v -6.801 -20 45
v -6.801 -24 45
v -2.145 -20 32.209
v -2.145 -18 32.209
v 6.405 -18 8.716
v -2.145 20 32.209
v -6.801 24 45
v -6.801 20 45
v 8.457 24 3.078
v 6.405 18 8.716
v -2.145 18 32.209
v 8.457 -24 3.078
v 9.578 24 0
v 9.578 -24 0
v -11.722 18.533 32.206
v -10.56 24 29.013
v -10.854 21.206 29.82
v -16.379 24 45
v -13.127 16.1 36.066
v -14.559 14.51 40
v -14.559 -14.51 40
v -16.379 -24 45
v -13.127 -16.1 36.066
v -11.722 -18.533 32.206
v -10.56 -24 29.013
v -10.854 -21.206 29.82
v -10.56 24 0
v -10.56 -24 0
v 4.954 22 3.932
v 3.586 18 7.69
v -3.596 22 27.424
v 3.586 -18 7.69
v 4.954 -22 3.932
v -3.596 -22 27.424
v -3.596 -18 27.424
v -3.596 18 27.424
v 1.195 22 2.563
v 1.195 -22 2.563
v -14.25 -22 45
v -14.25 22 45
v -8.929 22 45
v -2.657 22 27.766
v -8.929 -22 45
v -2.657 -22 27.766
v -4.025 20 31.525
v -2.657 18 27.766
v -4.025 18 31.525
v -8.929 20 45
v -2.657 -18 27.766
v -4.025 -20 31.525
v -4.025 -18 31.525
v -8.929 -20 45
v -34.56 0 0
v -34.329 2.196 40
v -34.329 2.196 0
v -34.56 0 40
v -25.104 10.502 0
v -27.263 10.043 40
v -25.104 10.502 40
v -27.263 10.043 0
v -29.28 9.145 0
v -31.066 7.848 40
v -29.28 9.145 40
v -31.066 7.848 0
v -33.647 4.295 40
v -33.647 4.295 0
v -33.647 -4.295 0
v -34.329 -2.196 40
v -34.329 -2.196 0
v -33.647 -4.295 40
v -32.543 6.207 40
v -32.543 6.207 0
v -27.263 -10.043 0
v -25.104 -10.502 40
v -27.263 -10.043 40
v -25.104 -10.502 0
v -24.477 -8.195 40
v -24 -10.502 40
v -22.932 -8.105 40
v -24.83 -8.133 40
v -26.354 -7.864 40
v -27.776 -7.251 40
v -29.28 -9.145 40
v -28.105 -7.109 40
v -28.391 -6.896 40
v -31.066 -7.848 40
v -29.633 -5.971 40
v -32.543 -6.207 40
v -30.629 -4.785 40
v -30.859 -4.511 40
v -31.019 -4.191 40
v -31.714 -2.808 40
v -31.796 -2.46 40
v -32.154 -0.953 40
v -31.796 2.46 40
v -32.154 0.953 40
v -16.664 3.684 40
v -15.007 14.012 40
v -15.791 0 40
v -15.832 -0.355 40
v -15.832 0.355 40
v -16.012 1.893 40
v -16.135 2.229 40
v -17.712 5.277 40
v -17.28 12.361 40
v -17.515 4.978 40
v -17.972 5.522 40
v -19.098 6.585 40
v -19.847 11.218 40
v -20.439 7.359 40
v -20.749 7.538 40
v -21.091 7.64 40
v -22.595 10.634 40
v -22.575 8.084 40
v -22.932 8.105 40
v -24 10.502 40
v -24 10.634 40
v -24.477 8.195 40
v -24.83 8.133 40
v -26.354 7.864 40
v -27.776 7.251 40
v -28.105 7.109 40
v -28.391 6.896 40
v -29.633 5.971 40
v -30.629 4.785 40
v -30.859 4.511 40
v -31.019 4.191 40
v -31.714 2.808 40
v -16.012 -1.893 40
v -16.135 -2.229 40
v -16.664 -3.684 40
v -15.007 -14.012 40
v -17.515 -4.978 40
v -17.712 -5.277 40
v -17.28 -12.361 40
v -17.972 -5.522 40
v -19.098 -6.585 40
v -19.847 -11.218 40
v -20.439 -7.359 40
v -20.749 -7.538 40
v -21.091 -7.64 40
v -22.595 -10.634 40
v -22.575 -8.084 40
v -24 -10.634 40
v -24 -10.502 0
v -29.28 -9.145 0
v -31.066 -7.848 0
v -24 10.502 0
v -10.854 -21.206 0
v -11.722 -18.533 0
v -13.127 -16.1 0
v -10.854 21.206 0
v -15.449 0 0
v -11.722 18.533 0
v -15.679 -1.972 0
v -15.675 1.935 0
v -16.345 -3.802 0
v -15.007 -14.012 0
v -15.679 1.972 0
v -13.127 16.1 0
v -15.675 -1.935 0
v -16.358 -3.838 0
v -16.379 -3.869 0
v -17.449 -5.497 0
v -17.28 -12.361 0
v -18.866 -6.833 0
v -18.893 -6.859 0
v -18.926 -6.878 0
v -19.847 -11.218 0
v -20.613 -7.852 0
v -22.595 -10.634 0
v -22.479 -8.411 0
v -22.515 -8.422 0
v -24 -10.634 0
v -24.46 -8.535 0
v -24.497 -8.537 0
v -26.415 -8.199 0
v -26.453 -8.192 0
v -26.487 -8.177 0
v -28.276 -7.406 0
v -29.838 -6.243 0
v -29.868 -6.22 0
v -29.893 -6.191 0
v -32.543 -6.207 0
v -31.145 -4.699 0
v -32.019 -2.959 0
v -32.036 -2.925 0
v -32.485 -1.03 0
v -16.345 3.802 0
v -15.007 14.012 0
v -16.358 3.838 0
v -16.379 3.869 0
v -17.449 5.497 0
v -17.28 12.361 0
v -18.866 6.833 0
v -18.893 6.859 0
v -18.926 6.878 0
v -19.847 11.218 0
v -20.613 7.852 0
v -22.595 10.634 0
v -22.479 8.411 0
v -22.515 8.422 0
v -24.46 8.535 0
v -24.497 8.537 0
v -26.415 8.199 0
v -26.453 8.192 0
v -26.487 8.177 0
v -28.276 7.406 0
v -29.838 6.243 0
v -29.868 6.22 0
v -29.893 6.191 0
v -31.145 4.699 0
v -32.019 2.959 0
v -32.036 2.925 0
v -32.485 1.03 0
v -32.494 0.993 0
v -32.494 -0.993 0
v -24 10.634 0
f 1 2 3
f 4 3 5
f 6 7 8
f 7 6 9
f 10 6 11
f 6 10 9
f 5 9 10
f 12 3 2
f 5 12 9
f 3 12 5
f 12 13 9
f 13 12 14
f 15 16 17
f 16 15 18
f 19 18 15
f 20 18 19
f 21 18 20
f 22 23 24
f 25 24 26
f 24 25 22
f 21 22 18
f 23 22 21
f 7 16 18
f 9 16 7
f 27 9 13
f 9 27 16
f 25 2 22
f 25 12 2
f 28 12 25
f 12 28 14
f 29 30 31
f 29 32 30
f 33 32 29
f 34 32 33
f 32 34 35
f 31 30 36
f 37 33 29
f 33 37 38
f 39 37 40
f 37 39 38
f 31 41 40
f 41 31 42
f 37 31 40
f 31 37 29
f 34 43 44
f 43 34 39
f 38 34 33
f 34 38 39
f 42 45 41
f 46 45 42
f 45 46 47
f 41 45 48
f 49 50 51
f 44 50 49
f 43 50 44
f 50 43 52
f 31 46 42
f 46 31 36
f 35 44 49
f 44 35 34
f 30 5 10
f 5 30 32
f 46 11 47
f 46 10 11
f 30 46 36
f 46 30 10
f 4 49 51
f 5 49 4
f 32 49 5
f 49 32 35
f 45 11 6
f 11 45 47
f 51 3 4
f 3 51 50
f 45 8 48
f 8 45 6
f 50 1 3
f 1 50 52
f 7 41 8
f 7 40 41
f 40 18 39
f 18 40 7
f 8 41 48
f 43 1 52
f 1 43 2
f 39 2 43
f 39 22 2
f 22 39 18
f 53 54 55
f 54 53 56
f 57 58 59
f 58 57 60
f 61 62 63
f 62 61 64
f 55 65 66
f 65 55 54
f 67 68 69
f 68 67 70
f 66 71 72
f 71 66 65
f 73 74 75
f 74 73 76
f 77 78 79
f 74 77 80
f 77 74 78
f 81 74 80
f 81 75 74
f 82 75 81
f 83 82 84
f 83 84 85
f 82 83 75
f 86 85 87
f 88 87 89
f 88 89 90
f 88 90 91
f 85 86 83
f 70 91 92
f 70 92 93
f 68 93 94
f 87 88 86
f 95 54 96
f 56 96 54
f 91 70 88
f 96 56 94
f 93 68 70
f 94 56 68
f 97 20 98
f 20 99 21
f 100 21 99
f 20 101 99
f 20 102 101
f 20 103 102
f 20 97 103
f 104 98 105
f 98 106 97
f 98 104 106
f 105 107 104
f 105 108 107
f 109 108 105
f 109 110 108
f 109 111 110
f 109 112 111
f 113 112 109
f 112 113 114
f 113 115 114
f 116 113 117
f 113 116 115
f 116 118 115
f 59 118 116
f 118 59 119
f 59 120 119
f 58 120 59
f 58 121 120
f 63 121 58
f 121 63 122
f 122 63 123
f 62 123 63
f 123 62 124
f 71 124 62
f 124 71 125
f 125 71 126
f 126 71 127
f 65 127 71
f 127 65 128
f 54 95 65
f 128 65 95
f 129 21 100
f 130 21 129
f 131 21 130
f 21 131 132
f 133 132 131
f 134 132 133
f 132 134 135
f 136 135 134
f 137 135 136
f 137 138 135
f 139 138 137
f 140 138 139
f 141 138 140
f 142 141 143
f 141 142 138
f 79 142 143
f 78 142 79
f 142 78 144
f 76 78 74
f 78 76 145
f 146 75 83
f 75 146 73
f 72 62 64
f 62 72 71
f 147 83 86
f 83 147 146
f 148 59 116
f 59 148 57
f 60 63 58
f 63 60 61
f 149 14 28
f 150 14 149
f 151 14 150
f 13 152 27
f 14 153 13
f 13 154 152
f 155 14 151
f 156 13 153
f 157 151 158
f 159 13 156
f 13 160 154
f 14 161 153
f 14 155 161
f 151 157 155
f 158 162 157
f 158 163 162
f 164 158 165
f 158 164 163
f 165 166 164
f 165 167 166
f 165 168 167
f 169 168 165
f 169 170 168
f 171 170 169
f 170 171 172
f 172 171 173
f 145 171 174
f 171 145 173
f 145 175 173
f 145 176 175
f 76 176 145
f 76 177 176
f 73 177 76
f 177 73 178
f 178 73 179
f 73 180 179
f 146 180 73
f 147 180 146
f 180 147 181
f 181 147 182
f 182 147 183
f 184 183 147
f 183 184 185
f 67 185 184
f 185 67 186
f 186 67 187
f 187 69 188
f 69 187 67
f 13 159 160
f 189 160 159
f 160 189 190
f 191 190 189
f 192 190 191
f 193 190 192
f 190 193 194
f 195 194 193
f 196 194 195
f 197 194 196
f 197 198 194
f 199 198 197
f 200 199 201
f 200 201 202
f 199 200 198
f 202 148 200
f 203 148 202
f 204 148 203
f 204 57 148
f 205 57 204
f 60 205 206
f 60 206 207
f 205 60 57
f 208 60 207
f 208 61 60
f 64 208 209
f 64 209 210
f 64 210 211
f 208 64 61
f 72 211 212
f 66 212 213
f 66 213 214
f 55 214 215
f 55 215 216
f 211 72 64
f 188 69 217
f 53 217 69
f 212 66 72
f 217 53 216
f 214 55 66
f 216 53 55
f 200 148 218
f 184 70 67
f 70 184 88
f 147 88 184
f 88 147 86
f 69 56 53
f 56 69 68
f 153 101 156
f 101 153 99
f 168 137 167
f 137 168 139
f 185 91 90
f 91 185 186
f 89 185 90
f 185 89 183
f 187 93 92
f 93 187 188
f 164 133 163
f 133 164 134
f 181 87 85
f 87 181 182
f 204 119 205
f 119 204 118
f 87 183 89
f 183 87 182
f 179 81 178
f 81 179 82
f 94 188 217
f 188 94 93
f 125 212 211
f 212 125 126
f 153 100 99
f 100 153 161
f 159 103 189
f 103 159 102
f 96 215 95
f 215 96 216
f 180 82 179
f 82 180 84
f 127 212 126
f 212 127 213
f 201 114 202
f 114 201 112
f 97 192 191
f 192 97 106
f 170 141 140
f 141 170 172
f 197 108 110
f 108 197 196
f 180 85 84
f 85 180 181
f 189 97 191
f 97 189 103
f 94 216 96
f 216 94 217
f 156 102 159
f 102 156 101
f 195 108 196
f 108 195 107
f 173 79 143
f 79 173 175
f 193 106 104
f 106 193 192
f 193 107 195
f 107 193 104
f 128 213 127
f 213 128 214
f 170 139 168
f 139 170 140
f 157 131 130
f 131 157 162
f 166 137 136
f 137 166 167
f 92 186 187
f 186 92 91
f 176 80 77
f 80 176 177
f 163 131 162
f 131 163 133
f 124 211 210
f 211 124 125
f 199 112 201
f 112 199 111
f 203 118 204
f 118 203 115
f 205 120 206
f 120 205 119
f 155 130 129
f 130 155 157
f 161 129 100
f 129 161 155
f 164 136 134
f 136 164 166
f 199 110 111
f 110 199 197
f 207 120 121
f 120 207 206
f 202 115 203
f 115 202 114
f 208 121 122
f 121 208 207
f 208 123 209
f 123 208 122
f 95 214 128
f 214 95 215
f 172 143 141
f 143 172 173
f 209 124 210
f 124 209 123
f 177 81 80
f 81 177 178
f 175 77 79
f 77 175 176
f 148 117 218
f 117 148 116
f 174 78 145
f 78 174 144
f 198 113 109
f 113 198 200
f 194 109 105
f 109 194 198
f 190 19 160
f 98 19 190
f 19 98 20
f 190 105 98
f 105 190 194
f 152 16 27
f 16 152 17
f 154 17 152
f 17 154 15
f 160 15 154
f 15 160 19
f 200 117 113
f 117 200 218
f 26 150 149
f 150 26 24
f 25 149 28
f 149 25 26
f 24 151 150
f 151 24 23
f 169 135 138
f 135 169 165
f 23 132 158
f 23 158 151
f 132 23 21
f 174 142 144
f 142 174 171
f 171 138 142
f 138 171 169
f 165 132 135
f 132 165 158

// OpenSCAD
// Slide mount for HTC Vive lighthouses
// This uses the wall mounts that come with the vive

BuildPoleMount();

poleRadius = 8; // Set this to the radius of the pole you want to mount it on
usedPoleRadius = poleRadius * 1.07;

// Thickness of the plastic around the pole and bracket - 2 should be fine for most cases
surround = 2; // Thickness of the parts around the pole and base

/* [Hidden] */
// Approximate size of the lighthouse wall brackets
bThickness = 5;
bWidth = 44;
bLength = 50;

module BaseClip(housingSurround=2){
    
    
    // Mount around it
    housingOverlap = 4; // What it clips under
    housingThickness = (housingSurround * 2) + bThickness;
    housingWidth = (housingSurround * 2) + bWidth;
    housingLength = (housingSurround * 2) + bLength;
    
    translate([0, -(bWidth+(housingSurround*2))/2, 0]){        
        difference(){
            cube([housingThickness, housingWidth, housingLength]);
            translate([housingSurround, housingSurround, housingSurround]){
                cube([bThickness-1, bWidth, bLength+20]);
            }
            translate([housingSurround, housingSurround, housingSurround+25]){
                cube([bThickness, bWidth, bLength]);
            }
            translate([housingSurround, housingSurround+housingOverlap, housingSurround+housingOverlap]){
                cube([50, (bWidth - (housingOverlap * 2)), bLength+20]);
            }
            translate([housingSurround, housingSurround+(housingOverlap/2), housingSurround+housingOverlap+25]){
                cube([50, (bWidth - (housingOverlap)), bLength+20]);
            }
        }
    }
}

module PoleClip(holeSurround=2){
    
    difference(){
        cylinder(h=40, r=(usedPoleRadius + holeSurround), center=false);
        translate([0, 0, -1]){
            cylinder(h=50, r1=usedPoleRadius, r2=usedPoleRadius*0.95, center=false);
        }        
    }       
}

module BuildPoleMount(){
    union(){
        difference(){            
            rotate([0, -20, 0]){
                BaseClip(surround);
            }
            // Top cut
            translate([-50, -50, 45]){
                cube([50, 100, 40]);
            }
        }
        translate([-(16+poleRadius), 0, 0]){
                PoleClip(surround);
        }
        difference(){
            // Connecting bit
            translate([-(16+poleRadius), -(bWidth+(surround*2))/2, 0]){
                cube([50, bWidth+(surround * 2), 40]);
            }
            rotate([0, -20, 0]){
                translate([4+bThickness, -bWidth, -10]){
                    cube([40, bWidth*2, 80]);
                }
                translate([0, -bWidth, 2]){
                    cube([20, bWidth*2, 40]);
                }
            }
            // Side curves
            translate([-(16+poleRadius), bWidth/2+surround, -1]){
                cylinder(h=60, r=bWidth/2 - usedPoleRadius, center=false);
            }
            translate([-(16+poleRadius), -(bWidth/2+surround), -1]){
                cylinder(h=60, r=bWidth/2 - usedPoleRadius, center=false);
            }
            // Redo the pole hole
            translate([-(16+poleRadius), 0, -1]){
                cylinder(h=50, r1=usedPoleRadius, r2=usedPoleRadius*0.95, center=false);
            }          
        } 
    }   
}
